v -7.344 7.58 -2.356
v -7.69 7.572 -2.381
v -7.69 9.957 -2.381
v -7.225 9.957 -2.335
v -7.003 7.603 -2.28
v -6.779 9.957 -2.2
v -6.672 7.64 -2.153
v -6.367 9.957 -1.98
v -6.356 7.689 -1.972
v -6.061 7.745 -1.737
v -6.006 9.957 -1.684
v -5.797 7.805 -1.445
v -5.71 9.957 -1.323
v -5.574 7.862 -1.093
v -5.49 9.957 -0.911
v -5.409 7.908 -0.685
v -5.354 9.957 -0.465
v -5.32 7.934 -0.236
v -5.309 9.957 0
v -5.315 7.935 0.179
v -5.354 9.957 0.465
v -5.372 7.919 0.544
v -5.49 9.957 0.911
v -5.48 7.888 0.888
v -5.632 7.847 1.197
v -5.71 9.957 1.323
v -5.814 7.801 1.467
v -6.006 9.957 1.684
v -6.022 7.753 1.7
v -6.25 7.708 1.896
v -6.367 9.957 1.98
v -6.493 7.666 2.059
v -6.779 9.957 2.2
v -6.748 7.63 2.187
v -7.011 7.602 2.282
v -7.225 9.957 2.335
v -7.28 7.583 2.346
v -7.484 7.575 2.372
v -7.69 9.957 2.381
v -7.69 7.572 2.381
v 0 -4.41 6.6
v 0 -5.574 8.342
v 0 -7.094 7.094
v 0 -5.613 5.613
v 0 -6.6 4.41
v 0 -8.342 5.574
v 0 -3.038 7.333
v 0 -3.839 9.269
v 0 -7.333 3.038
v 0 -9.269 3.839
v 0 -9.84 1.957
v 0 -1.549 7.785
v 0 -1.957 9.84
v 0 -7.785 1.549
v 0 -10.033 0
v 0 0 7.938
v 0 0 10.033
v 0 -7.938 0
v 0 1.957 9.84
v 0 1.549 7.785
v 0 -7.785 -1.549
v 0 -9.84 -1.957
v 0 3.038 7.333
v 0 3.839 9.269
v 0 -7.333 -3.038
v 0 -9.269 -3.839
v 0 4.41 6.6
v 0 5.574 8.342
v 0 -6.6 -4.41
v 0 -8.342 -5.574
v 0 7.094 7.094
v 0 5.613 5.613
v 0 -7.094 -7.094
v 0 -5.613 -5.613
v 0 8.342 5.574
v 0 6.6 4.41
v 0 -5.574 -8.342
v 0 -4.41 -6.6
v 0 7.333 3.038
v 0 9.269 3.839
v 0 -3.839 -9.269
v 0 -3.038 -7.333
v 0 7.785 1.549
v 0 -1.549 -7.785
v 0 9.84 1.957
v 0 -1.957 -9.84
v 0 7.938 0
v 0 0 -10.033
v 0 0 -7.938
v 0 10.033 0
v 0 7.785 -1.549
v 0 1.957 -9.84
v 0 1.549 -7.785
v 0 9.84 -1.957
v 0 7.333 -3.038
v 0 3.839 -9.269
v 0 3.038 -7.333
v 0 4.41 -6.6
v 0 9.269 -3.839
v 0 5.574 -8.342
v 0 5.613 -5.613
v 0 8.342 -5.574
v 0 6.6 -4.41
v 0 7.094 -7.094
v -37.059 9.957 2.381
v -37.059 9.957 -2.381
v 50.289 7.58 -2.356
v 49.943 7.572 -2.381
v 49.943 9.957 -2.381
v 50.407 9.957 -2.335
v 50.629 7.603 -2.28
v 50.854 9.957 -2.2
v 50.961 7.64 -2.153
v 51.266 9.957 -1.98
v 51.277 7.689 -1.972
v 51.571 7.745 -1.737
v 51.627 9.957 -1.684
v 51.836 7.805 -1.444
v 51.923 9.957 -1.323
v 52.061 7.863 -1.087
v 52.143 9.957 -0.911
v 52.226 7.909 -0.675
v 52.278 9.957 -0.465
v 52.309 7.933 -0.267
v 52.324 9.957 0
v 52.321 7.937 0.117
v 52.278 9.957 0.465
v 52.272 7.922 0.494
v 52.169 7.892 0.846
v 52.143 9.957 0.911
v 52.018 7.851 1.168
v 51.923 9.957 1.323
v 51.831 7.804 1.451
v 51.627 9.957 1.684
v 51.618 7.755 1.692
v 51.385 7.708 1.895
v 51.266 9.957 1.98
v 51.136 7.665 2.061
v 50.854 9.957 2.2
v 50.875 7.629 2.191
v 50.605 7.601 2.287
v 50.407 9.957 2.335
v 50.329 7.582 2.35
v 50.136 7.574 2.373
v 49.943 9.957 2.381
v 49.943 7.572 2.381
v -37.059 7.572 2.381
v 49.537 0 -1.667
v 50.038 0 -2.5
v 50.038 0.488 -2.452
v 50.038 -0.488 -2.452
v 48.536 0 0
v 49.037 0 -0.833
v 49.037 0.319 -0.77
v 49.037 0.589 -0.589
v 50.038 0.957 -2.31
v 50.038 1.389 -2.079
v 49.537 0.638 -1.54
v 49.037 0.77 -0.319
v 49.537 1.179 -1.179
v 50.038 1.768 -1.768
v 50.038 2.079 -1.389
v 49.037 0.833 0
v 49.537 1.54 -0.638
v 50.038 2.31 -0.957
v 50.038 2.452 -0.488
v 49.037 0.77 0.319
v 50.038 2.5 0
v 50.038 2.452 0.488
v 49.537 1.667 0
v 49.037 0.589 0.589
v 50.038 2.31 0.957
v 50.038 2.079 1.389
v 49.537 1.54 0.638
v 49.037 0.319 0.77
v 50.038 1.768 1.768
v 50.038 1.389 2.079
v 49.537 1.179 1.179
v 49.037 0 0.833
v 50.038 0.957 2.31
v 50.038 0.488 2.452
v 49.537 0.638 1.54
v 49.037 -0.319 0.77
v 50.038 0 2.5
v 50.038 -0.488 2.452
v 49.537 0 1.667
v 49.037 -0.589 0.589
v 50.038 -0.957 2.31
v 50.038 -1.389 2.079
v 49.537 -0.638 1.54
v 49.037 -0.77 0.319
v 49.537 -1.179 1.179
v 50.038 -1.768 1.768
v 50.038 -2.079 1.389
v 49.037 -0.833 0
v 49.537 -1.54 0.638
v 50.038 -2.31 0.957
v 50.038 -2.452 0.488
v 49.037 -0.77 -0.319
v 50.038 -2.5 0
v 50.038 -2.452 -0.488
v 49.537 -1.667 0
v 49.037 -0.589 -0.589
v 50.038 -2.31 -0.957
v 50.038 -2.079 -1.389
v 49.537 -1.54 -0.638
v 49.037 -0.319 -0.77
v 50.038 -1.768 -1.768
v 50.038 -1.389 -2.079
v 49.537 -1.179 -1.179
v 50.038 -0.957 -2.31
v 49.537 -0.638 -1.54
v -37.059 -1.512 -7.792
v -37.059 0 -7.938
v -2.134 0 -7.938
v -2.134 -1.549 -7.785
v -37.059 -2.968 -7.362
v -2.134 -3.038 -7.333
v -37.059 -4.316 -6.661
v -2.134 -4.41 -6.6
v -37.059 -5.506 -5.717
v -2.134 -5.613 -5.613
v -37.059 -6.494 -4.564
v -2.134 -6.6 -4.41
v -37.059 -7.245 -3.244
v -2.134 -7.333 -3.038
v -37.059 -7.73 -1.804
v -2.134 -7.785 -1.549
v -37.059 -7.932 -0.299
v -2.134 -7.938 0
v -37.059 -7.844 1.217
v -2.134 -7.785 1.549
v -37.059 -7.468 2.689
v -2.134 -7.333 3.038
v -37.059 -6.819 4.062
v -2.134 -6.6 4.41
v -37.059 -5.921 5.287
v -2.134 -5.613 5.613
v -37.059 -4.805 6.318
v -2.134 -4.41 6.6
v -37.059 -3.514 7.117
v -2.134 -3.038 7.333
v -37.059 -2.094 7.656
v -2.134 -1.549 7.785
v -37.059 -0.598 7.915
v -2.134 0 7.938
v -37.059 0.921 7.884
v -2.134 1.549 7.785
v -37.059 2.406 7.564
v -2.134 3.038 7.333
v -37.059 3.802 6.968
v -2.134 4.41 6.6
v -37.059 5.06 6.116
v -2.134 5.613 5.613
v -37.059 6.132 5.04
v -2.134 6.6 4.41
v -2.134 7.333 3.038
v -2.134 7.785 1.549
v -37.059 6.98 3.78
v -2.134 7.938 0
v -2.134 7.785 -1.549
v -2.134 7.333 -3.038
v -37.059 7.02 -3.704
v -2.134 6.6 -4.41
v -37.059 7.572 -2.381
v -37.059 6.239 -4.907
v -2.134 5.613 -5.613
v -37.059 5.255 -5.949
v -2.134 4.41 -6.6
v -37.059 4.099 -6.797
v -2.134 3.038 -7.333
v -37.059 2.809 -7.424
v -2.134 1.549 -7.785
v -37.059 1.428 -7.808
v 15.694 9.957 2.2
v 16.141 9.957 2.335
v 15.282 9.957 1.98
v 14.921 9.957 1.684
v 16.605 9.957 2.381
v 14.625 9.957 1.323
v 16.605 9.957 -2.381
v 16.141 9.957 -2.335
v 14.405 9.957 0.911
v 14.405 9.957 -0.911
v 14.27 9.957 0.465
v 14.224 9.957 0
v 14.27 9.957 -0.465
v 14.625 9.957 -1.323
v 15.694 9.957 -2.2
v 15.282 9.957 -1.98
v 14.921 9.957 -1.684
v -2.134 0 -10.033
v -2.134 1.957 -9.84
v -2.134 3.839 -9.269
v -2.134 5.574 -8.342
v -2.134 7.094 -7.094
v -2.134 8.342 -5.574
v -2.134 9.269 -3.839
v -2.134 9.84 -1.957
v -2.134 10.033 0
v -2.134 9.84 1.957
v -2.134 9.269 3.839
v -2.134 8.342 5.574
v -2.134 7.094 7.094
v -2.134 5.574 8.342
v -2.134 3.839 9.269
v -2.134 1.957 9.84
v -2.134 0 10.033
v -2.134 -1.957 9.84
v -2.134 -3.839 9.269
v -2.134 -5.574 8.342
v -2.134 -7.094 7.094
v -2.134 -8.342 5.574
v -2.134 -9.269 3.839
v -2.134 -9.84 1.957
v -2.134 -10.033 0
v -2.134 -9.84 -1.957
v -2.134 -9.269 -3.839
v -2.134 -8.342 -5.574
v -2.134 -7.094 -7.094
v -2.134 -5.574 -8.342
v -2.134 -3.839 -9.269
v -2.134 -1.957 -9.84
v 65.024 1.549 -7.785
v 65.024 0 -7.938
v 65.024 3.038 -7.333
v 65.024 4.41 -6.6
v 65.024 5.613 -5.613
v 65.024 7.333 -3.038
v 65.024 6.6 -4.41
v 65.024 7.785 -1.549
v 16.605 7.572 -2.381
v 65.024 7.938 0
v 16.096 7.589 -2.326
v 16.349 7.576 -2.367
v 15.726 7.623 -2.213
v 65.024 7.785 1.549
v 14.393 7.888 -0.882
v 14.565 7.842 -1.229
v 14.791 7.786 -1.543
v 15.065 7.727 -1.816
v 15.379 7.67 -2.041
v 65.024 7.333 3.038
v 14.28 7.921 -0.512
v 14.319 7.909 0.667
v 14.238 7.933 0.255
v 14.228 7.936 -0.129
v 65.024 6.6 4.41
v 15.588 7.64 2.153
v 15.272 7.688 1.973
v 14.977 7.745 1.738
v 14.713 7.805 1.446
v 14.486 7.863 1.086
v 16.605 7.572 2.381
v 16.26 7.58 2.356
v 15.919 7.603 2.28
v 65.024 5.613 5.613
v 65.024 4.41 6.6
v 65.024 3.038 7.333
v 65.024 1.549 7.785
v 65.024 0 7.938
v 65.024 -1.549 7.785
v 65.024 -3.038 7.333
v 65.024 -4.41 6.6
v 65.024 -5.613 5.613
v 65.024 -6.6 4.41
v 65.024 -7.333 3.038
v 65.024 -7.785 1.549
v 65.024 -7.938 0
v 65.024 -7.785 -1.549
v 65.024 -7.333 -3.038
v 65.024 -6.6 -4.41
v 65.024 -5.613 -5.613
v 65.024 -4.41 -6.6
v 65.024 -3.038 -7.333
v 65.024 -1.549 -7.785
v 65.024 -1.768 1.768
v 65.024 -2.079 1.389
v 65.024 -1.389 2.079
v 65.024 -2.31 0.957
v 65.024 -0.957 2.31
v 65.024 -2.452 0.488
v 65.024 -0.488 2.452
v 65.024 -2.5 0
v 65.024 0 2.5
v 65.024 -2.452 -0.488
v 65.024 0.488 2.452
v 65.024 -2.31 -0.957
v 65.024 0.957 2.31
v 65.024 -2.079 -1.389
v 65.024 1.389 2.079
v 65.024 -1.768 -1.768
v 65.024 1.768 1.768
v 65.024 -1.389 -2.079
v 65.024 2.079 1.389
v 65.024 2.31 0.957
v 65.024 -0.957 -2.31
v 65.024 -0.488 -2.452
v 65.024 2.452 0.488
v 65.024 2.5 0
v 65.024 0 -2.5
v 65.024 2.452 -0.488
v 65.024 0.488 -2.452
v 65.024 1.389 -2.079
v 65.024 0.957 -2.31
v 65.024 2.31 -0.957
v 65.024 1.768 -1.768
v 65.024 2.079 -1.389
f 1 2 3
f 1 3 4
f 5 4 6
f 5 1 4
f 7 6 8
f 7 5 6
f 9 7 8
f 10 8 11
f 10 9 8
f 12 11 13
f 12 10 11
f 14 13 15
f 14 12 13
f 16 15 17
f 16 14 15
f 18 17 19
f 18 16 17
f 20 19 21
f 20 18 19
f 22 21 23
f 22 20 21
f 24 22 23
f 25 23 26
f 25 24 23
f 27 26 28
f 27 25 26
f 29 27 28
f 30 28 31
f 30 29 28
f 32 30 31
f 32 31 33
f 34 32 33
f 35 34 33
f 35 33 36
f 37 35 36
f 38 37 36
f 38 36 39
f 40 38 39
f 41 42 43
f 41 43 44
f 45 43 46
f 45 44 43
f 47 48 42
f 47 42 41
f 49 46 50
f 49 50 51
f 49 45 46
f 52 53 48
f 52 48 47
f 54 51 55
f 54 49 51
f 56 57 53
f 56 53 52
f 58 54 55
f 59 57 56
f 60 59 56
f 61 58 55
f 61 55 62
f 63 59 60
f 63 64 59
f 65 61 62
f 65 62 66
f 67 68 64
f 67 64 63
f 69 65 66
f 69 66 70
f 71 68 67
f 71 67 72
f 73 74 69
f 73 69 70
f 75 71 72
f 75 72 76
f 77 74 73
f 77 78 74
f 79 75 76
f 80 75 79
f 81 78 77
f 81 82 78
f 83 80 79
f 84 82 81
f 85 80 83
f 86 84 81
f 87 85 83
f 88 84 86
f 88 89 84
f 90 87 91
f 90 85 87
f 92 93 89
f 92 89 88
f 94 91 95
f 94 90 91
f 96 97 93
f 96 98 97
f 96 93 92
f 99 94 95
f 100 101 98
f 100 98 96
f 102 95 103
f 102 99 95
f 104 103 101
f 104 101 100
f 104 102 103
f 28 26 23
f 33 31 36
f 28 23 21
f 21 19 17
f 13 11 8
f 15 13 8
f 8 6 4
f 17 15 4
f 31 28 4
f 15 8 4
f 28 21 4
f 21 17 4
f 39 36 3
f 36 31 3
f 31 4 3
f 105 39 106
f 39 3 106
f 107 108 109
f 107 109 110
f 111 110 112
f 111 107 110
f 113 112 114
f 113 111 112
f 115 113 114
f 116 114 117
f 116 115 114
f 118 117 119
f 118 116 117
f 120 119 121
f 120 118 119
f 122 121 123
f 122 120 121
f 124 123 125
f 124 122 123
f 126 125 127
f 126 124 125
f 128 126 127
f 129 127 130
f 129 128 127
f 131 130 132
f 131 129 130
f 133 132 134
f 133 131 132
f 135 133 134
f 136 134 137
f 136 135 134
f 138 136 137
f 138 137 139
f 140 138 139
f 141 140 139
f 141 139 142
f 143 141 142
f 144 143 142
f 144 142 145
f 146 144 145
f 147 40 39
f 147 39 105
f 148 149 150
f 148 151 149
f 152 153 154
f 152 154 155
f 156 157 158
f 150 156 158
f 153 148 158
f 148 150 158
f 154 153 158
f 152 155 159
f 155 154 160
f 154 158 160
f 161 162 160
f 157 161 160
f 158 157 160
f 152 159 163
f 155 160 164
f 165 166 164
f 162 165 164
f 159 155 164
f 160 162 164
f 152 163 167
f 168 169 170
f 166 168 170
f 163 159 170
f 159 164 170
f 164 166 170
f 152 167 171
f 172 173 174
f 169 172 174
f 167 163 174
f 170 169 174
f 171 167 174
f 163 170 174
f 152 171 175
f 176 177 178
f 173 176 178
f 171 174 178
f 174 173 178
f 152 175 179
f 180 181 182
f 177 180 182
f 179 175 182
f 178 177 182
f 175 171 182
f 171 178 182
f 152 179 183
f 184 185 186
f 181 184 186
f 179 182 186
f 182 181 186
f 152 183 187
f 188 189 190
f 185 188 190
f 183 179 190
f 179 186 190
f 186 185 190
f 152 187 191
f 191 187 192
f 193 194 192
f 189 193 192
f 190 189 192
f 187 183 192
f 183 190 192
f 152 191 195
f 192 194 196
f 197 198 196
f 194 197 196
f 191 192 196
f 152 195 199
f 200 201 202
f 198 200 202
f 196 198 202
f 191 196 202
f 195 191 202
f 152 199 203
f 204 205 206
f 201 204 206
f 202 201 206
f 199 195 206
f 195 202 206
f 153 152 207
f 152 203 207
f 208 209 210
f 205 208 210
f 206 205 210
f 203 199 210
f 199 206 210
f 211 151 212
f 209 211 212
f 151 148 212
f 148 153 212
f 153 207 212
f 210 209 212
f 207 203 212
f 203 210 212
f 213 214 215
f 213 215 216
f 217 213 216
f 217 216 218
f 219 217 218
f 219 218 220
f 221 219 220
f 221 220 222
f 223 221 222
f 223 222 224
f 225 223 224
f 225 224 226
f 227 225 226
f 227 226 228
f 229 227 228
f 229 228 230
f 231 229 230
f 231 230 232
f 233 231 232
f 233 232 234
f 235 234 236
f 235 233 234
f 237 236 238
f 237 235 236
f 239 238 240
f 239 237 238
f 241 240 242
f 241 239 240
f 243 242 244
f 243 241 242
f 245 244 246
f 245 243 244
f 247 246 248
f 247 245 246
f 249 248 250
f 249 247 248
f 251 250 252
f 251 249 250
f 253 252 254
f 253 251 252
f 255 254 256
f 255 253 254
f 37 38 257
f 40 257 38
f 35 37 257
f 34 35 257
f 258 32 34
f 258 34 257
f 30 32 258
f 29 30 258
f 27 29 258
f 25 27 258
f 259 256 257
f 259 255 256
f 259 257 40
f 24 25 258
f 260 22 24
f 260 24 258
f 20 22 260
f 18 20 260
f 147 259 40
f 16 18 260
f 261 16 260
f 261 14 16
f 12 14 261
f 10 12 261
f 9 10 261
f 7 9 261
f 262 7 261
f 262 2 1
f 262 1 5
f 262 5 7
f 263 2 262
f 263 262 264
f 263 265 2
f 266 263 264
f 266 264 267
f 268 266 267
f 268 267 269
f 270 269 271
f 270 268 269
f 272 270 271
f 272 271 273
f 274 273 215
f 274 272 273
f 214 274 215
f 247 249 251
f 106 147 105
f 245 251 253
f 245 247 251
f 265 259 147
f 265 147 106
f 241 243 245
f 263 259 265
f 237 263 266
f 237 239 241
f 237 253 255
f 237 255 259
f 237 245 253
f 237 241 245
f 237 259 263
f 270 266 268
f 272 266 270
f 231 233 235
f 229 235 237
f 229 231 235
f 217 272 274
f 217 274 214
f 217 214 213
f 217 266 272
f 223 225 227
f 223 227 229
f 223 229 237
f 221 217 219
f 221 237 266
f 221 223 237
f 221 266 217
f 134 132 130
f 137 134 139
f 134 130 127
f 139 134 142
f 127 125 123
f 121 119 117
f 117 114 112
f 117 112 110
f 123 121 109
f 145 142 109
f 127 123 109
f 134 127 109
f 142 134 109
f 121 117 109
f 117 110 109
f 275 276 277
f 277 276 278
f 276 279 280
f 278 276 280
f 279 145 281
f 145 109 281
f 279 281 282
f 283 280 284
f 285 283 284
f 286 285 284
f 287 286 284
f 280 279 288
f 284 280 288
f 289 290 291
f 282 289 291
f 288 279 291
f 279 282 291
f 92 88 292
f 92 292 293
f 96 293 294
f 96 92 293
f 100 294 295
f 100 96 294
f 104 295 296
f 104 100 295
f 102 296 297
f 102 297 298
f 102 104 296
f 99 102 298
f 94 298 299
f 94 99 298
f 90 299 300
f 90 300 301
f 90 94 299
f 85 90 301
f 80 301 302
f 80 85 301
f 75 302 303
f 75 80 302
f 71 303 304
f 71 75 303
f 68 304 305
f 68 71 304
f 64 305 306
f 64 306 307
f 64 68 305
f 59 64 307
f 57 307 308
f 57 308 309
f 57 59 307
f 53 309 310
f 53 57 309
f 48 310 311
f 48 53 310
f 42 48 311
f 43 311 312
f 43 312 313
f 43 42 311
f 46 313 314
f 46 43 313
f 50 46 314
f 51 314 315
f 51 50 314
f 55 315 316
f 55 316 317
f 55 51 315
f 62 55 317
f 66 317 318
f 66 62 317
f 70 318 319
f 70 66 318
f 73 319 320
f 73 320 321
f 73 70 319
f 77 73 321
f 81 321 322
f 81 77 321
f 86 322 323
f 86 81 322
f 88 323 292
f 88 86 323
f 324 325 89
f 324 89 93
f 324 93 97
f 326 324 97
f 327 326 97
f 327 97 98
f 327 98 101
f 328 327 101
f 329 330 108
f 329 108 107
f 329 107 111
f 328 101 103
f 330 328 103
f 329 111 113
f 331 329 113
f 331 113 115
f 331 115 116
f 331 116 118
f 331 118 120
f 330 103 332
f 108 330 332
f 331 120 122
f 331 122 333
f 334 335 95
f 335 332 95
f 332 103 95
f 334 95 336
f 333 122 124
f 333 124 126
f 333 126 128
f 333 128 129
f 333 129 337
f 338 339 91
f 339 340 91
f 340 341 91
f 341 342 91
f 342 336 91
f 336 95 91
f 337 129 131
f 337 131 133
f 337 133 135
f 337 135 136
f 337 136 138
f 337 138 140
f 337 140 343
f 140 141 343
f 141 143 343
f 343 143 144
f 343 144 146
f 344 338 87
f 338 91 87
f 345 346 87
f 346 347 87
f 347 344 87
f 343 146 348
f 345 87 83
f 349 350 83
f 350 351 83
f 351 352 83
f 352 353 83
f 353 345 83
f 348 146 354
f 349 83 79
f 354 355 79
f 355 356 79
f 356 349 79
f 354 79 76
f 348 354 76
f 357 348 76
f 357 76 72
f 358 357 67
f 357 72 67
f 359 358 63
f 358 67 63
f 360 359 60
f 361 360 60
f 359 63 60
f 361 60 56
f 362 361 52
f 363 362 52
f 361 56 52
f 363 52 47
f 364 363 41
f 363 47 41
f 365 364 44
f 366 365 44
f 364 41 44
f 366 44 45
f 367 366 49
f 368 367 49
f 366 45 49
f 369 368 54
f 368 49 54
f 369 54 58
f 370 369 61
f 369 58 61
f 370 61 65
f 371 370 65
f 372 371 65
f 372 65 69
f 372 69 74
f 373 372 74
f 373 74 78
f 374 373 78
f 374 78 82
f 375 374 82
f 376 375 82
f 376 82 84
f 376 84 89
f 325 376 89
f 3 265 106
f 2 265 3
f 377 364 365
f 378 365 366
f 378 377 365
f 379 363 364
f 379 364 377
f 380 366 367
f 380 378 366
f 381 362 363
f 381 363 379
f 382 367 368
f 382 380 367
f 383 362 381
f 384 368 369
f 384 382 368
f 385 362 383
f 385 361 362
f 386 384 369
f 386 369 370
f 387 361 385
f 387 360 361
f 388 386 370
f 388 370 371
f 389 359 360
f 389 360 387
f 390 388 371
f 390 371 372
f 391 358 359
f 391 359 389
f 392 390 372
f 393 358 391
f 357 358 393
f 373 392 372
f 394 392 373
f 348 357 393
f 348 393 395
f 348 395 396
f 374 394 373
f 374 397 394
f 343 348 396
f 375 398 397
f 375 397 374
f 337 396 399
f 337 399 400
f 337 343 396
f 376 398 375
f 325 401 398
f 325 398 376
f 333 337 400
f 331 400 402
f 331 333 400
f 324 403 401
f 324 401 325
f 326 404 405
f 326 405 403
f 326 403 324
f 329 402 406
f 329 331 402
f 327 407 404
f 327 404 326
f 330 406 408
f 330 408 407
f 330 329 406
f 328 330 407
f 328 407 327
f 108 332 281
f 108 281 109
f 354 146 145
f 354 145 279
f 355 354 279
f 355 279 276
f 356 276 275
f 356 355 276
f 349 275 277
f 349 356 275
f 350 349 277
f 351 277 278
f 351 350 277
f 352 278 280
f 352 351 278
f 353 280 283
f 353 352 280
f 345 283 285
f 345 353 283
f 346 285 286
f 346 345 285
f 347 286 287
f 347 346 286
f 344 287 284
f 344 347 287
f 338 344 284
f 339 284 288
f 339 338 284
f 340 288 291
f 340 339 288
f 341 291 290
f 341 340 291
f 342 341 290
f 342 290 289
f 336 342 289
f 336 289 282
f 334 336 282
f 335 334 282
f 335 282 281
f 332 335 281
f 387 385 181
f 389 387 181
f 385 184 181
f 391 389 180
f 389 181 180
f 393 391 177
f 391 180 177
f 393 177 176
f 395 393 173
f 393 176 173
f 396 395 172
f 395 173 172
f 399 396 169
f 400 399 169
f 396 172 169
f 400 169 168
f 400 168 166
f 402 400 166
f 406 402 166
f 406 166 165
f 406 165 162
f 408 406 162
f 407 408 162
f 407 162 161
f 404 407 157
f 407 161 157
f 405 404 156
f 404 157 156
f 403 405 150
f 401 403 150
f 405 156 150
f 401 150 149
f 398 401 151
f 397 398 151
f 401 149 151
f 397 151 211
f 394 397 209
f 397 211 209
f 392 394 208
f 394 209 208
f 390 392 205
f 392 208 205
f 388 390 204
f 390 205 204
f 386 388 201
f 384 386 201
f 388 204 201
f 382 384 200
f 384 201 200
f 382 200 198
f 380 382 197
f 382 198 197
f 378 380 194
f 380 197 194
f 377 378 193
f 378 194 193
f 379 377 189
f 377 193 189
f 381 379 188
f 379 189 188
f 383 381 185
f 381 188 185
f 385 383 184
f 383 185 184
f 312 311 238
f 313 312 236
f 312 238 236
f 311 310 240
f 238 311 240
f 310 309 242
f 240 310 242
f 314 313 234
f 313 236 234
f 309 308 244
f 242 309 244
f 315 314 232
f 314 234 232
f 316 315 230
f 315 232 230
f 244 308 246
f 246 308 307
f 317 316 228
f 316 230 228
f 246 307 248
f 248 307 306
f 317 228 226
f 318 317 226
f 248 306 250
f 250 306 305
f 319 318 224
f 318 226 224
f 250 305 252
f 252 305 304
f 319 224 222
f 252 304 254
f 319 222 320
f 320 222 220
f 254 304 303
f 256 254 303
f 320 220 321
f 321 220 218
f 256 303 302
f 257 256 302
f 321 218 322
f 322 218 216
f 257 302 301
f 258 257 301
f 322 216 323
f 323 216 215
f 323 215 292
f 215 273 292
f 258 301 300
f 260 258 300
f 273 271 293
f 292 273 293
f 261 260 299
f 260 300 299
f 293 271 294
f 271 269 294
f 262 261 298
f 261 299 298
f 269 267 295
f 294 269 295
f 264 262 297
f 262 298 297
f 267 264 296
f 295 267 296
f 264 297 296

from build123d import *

# Parameters (mm, degrees)
SKETCH1_R             = 10.033
BOSS_EXTRUDE1_DEPTH   = 2.1336
SKETCH2_R             = 7.9375
BOSS_EXTRUDE2_DEPTH   = 65.024
M6_TAPPED_HOLE1_D     = 5
M6_TAPPED_HOLE1_DEPTH = 14.986
M6_TAPPED_HOLE1_TIP   = 1.502151548
BOSS_EXTRUDE3_START   = 34.925
SKETCH5_R             = 7.9375
BOSS_EXTRUDE3_DEPTH   = 34.925
BOSS_EXTRUDE4_DEPTH   = 4.7625


with BuildPart() as part:
    # Sketch1 → Boss-Extrude1 (new body)
    with BuildSketch(Plane(origin=(0, 0, 0), x_dir=(0, 0, -1), z_dir=(1, 0, 0))):
        Circle(SKETCH1_R)
    extrude(amount=-BOSS_EXTRUDE1_DEPTH)

    # Sketch2 → Boss-Extrude2 (add)
    with BuildSketch(Plane(origin=(0, 0, 0), x_dir=(0, 0, -1), z_dir=(1, 0, 0))):
        Circle(SKETCH2_R)
    extrude(amount=BOSS_EXTRUDE2_DEPTH)

    # M6 Tapped Hole1
    with Locations(Plane(origin=(65.024, 0, 0), x_dir=(0, 0, -1), z_dir=(1, 0, 0))):
        with Locations((0, 0)):
            Hole(M6_TAPPED_HOLE1_D / 2, depth=M6_TAPPED_HOLE1_DEPTH)
            with Locations((0, 0, -(M6_TAPPED_HOLE1_DEPTH + M6_TAPPED_HOLE1_TIP / 2))):  # 118° drill point
                Cone(0, M6_TAPPED_HOLE1_D / 2, M6_TAPPED_HOLE1_TIP, mode=Mode.SUBTRACT)

    # Sketch5 → Boss-Extrude3 (add)
    with BuildSketch(Plane.ZY.offset(2.1336).offset(BOSS_EXTRUDE3_START)):
        with Locations(Location((0, 0, 0), (0, 0, 180))):
            Circle(SKETCH5_R)
    extrude(amount=-BOSS_EXTRUDE3_DEPTH)

    # Sketch7 → Boss-Extrude4 (add)
    with BuildSketch(Plane(origin=(0, 5.1943, 0), x_dir=(1, 0, 0), z_dir=(0, 1, 0))):
        with BuildLine():
            Line((16.60525, 2.38125), (49.94275, 2.38125))
            ThreePointArc((49.94275, 2.38125), (52.324, 0), (49.94275, -2.38125))
            Line((49.94275, -2.38125), (16.60525, -2.38125))
            ThreePointArc((16.60525, -2.38125), (14.224, 0), (16.60525, 2.38125))
        make_face()
        with BuildLine():
            Line((-37.0586, 2.38125), (-7.68985, 2.38125))
            ThreePointArc((-7.68985, 2.38125), (-5.3086, 0), (-7.68985, -2.38125))
            Line((-7.68985, -2.38125), (-37.0586, -2.38125))
            Line((-37.0586, -2.38125), (-37.0586, 2.38125))
        make_face()
    extrude(amount=BOSS_EXTRUDE4_DEPTH)


solid = part.part
